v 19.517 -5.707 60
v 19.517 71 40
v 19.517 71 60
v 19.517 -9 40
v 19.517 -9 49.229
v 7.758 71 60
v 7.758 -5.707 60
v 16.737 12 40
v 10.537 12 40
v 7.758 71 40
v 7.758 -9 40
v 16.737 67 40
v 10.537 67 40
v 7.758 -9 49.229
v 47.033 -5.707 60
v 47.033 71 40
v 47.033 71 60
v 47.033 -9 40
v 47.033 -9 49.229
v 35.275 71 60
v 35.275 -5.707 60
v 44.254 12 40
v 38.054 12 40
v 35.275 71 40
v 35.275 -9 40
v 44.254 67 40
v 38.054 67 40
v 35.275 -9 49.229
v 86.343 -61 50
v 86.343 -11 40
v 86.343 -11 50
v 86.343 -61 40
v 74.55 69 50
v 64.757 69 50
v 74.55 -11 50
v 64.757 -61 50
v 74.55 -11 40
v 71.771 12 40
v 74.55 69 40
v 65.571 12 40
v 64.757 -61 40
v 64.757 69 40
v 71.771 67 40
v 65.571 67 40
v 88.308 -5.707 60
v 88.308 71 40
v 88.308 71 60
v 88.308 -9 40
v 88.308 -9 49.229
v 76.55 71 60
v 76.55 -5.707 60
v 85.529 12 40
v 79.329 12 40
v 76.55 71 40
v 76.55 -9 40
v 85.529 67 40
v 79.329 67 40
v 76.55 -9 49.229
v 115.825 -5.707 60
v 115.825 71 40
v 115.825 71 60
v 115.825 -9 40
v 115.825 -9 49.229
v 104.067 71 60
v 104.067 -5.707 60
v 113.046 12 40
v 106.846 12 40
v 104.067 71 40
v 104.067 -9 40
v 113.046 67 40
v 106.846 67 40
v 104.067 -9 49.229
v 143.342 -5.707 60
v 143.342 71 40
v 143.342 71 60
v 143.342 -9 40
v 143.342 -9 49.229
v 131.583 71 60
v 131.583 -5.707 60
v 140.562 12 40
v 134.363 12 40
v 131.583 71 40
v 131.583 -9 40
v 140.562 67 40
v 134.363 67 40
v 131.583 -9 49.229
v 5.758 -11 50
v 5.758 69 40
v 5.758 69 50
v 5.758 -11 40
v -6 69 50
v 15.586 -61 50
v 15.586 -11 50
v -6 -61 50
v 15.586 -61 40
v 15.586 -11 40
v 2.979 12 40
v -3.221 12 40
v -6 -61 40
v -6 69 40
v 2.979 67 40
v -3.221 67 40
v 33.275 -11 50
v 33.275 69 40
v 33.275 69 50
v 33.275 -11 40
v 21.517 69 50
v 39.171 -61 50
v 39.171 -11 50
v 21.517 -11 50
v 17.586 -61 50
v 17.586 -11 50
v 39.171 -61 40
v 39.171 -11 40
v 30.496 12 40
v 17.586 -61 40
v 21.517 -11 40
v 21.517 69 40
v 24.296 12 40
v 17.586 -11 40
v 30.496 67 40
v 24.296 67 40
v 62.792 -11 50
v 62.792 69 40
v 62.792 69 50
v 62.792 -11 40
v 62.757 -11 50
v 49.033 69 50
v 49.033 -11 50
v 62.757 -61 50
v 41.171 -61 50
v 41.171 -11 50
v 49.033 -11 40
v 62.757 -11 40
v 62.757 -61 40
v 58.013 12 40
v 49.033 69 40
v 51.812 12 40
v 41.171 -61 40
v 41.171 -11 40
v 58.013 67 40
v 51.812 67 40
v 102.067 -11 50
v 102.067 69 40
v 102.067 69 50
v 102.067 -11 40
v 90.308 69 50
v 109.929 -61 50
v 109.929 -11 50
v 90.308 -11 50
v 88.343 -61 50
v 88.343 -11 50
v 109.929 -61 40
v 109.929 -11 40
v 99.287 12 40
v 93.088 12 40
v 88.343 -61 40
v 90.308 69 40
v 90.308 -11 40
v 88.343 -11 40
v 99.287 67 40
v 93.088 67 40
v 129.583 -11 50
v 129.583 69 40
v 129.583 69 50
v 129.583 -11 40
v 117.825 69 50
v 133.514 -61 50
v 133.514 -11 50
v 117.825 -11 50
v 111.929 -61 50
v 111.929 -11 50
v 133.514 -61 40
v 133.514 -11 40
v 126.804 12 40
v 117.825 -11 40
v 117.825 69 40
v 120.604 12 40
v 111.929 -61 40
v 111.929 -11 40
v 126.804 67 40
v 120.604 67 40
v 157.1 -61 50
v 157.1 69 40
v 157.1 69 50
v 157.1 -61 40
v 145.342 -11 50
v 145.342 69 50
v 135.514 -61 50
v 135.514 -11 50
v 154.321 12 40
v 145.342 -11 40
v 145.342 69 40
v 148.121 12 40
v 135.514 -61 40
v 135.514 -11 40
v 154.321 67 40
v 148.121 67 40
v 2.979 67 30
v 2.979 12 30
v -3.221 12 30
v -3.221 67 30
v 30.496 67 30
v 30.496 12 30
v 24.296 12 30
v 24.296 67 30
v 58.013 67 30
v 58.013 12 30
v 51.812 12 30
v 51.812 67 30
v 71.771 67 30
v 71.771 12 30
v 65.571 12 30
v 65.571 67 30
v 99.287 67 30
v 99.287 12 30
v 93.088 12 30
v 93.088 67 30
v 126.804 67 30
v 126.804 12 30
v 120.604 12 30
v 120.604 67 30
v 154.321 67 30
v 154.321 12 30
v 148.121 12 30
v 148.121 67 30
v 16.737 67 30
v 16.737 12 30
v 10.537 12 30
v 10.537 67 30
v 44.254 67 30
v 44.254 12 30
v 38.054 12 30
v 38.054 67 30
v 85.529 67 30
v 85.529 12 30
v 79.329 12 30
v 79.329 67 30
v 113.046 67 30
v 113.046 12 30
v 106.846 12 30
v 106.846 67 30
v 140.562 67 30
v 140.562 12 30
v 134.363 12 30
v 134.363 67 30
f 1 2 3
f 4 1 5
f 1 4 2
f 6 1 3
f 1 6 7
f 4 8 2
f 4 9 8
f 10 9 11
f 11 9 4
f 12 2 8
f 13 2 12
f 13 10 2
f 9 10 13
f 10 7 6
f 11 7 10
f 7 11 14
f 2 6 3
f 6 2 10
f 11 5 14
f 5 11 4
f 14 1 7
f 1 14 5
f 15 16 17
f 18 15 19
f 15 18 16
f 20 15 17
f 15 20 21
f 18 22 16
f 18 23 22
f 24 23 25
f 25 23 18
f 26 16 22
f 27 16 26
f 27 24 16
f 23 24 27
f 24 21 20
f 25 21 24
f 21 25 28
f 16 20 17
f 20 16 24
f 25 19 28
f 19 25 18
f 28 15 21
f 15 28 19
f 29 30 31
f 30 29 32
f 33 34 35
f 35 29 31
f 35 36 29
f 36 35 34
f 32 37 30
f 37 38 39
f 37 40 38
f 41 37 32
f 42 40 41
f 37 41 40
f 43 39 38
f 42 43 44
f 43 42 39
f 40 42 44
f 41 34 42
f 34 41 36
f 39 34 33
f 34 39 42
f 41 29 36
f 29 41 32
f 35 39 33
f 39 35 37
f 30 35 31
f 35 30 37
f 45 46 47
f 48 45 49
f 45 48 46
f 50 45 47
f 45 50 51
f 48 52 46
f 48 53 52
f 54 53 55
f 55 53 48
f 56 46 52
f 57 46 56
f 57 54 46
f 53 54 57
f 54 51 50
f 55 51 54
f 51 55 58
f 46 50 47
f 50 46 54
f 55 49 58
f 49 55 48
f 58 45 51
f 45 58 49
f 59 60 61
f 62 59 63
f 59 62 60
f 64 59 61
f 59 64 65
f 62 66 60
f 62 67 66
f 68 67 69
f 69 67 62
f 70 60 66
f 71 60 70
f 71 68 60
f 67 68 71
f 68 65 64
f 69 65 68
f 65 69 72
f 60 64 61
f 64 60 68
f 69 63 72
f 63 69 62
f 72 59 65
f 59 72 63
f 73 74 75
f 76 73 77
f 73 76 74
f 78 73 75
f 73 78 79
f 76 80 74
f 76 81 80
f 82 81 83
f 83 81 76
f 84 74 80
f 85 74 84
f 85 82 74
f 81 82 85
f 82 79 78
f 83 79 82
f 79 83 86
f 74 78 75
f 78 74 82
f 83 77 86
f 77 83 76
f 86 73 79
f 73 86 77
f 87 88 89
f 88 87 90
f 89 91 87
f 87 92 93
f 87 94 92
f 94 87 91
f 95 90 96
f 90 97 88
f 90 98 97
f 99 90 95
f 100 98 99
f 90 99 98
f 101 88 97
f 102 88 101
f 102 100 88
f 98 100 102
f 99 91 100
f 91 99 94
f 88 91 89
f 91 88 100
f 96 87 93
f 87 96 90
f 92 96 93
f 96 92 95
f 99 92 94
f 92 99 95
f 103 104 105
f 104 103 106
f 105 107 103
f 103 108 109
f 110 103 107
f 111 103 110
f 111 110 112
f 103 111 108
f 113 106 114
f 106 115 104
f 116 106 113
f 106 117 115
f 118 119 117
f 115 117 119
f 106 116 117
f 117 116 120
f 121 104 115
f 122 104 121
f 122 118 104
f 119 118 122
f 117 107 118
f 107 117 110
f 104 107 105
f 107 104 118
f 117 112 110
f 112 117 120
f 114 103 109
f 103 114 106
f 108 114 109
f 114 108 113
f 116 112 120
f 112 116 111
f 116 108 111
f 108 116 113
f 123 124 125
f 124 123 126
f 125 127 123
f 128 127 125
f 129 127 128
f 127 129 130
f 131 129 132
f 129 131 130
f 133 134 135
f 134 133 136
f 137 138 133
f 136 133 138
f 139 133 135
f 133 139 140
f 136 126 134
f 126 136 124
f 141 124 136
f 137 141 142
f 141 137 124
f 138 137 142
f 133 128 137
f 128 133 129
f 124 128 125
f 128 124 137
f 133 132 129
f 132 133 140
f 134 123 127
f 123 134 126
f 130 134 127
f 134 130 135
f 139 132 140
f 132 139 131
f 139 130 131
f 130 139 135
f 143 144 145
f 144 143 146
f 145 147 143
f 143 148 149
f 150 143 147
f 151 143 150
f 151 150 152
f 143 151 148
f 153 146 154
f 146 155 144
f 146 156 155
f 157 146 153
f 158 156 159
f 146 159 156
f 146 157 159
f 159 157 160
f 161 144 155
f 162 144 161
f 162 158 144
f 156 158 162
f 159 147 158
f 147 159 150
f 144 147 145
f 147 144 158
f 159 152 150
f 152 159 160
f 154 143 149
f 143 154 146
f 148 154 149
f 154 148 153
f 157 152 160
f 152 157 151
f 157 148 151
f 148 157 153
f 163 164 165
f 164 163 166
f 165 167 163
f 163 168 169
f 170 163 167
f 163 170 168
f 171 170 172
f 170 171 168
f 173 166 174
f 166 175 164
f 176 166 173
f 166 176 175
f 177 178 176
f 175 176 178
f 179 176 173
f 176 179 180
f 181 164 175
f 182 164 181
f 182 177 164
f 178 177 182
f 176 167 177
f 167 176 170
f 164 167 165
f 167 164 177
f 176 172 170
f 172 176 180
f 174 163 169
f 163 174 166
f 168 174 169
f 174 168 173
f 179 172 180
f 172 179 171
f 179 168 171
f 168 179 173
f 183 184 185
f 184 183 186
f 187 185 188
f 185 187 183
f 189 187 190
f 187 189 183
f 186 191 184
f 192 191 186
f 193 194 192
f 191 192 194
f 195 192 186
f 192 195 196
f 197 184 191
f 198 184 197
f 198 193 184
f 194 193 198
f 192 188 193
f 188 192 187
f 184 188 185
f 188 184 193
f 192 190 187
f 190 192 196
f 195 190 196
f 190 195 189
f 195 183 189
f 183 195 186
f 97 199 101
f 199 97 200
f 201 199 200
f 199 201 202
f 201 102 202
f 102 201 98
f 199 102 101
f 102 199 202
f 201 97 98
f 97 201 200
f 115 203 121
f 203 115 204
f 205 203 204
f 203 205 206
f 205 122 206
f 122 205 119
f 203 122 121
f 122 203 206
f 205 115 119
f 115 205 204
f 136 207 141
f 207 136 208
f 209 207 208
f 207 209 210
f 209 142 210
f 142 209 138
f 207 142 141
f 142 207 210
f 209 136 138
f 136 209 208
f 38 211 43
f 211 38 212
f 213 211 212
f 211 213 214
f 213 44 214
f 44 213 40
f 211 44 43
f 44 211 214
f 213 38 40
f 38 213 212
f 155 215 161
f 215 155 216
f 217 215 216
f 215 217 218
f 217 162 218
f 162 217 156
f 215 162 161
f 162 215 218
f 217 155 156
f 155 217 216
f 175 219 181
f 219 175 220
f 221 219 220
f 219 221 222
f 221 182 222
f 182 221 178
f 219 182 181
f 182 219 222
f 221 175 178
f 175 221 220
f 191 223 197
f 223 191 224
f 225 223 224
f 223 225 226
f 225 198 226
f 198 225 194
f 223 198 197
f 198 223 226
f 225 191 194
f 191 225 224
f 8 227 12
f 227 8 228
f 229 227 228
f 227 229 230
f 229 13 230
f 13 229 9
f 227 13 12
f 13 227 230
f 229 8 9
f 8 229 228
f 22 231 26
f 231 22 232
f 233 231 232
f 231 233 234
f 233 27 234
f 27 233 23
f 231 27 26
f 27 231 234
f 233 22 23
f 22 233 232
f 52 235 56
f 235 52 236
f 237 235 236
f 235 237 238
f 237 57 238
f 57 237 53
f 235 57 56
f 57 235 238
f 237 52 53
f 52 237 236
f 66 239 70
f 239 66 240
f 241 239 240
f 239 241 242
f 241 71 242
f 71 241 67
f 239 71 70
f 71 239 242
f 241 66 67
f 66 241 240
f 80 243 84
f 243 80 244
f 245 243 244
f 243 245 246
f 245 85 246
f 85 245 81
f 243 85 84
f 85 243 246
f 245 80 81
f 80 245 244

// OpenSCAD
// file: snap_lock_v1.scad
//
//  Snap mechanism
//
//  by Egil Kvaleberg
//

// Which part
view = "neither";//"snap";//"both"; 	// [demo, both, snap, bracket]

//
//  main parameters, tune as required:
//

// distance between centers of mount holes that seperate
mount_cc_dist = 12;//20;//35.0; 
mount_cc_width = 9;//17;//32.0;

// thickness of main part
thickness0 = 1.7;
thickness = 4;//2.4;//3.0; 

// mounting screw diameter
screw_dia = 0;//2.5; // BUG: 3.0

screw_head = 2.0*screw_dia;

// tolerance
gap = 0.2; 

//screw_land = screw_dia/2; // land outside of screw head
screw_land = 0;

//snap_width = mount_cc_width - 2*screw_land - screw_head - 2*thickness;  // width of mechanism proper
snap_width = mount_cc_width - 2*thickness0;
//mount_width = mount_cc_width + 2*screw_land + screw_head;
mount_width = mount_cc_width;
//mount_height = 2*screw_land + screw_head;
mount_height = 0;
catch_width = snap_width * 0.15; // in addition to snap_width
snap_bar_width = (snap_width - 2.4 * catch_width) / 2 + 0; // room to flex
catch_min_width = 0.3 * snap_bar_width; // nicely rounded form
//catch_length = (mount_height+mount_cc_dist) / 4;
catch_length = (mount_cc_dist) / 4 + 0;;


d = 1*0.1;
$fs = 0.2;

module rounded_bar(r, h) {
	intersection() {
		cylinder(r=r, h=h);
		translate([0,0, h/2])
		cube([2*r * 0.85, 2*r* 0.85, h], center=true);
/*		hull() {
			translate([0, r, h/2 - r]) rotate([90,0,0]) cylinder(r=r, h=2*r);	
			translate([0, r, -(h/2 - r)]) rotate([90,0,0]) cylinder(r=r, h=2*r);		
		}
*/
	}
}

module screw_hole()
{
	sh = screw_head/2 - (screw_dia/2 + gap);	
	cylinder(r=screw_dia/2 + gap, h = d+thickness+d);
	translate([0, 0, d+thickness-sh])
		cylinder(r1=screw_dia/2 + gap, r2 = screw_head/2, h = sh+d);
}

module snap_half() {
	translate([-mount_width/2, 0, 0]) {
		// screw mount
		difference() {
			cube([mount_width/2 + d, mount_height, thickness]);
			translate([screw_land + screw_head/2, screw_land + screw_head/2, -d]) screw_hole();
		}
	}
	translate([-snap_width/2, 0, 0]) {
		// base arm
		cube([snap_bar_width, mount_height+mount_cc_dist+catch_min_width/2+d, thickness]);

		// catch
		translate([-catch_width, mount_height+mount_cc_dist, 0]) {
			hull() {
				cylinder(r=d, h=thickness); 
				translate([catch_width+snap_bar_width-catch_min_width/2, catch_min_width/2, 0]) 
					cylinder(r=catch_min_width/2, h=thickness); 
				// top of "arrow", sloping inwards to allow more bending
				translate([0.85 * (catch_width+snap_bar_width-catch_min_width/2), catch_length-catch_min_width/2, 0]) 
					cylinder(r=catch_min_width/2, h=thickness); 
			}
			//cube([catch_width, catch_length, thickness]);
		}

	}
}

module snap() {
	snap_half();
	mirror([1, 0, 0]) snap_half();	
}

module bracket_half() {

	translate([-mount_width/2, 0, 0]) {
		// screw mount
		difference() {
			cube([2*screw_land+screw_head+thickness, mount_height, thickness]);
			translate([screw_land + screw_head/2, screw_land + screw_head/2, -d]) screw_hole();
		}
		translate([2*screw_land+screw_head, 0, 0]) {
			cube([thickness, mount_height, thickness + gap + thickness]);
			translate([0, 0, gap + thickness]) {
				cube([snap_width/2 + thickness + d, mount_height, thickness]);
			}
		}

	}
}

module bracket() {
	bracket_half();
	mirror([1, 0, 0]) bracket_half();	
}

if (view == "demo") {
	snap();
	color("Red") translate([0, mount_cc_dist-d, 0]) bracket();
}
if (view == "snap") {
	snap();
}
if (view == "bracket") {
	translate([0, -2, 0]) rotate([90, 0, 0])  bracket();
}
if (view == "both") {
	snap();
	translate([0, -2, 0]) rotate([90, 0, 0])  bracket();
}
// main file
//include <irkem_hammerTips_v0.scad>
include <snap_lock_v1.scad>

xO = -6;
yO = -11;
zO = 40;

kH = 10;//4;
bH = 10;
wL = 50;
bL = 80;
oct = 6.5 * 25.4;
gap = 2;
n_oct = 1;//5;
n_keys = 12;//12 * n_oct;
oset = -1;

kn = 2;

sharpFlag = 1;

for (k = [0:1:(n_keys-1)]){
    //
    //translate([k*13.75+6.0+xO,12+yO,-12.5+zO]) rotate([0,180,0]) hammerTips();
}

for (k = [0:1:(n_oct-1)]){

//if (k==1){
//C:
color("ivory") translate([k*oct+0+xO,0+yO,0+zO]) cube([oct*1/12-gap,bL,kH]);
color("ivory") translate([k*oct+0+xO,-wL+yO,0+zO]) cube([oct*1/7-gap,wL,kH]);
//}

//if (k==2){
//C#:
if (sharpFlag){    
color("black") difference(){
    translate([k*oct+oct*1/12+xO,gap+yO,0+zO]) cube([oct*1/12-gap,bL,kH+bH]);
    rotate([-17,0,0]) translate([k*oct+oct*1/12+xO,gap+yO-10-14,0+zO]) cube([oct*1/12-gap,10,kH+bH]);
}
}
//}

//if (k==3){
//D:
color("ivory") translate([k*oct+oct*2/12+xO,0+yO,0+zO]) cube([oct*1/12-gap,bL,kH]);
color("ivory") translate([k*oct+oct*1/7+xO,-wL+yO,0+zO]) cube([oct*1/7-gap,wL,kH]);
//}

//if (k==4){
//D#:
if (sharpFlag){
color("black") difference(){
    translate([k*oct+oct*3/12+xO,gap+yO,0+zO]) cube([oct*1/12-gap,bL,kH+bH]);
    rotate([-17,0,0]) translate([k*oct+oct*3/12+xO,gap+yO-10-14,0+zO]) cube([oct*1/12-gap,10,kH+bH]);
}
}
//}

//if (k==5){
//E:
color("ivory") translate([k*oct+oct*4/12+xO,0+yO,0+zO]) cube([2+oct*1/12-gap,bL,kH]);
color("ivory") translate([k*oct+oct*2/7+xO,-wL+yO,0+zO]) cube([oct*1/7-gap,wL,kH]);
//}

//if (k==6){
//F:
color("ivory") difference(){
    translate([k*oct+oct*3/7+xO,-wL+yO,0+zO]) cube([oct*1/7-gap,wL+bL,kH]);
    translate([k*oct+oct*6/12-2+xO,0+yO,0+zO]) cube([4+oct*(1/7-1/12)-gap,bL,kH]);
}
color("ivory") translate([k*oct+oct*3/7+xO,-wL+yO,0+zO]) cube([oct*1/7-gap,wL,kH]);
//}

//if (k==7){
//F#:
if (sharpFlag){
color("black") difference(){
    translate([k*oct+oct*6/12+xO,gap+yO,0+zO]) cube([oct*1/12-gap,bL,kH+bH]);
    rotate([-17,0,0]) translate([k*oct+oct*6/12+xO,gap+yO-10-14,0+zO]) cube([oct*1/12-gap,10,kH+bH]);
}
}
//}

//if (k==8){
//G:
color("ivory") translate([k*oct+oct*7/12+xO,0+yO,0+zO]) cube([oct*1/12-gap,bL,kH]);
color("ivory") translate([k*oct+oct*4/7+xO,-wL+yO,0+zO]) cube([oct*1/7-gap,wL,kH]);
//}

//if (k==9){
//G#:
if (sharpFlag){
color("black") difference(){
    translate([k*oct+oct*8/12+xO,gap+yO,0+zO]) cube([oct*1/12-gap,bL,kH+bH]);
    rotate([-17,0,0]) translate([k*oct+oct*8/12+xO,gap+yO-10-14,0+zO]) cube([oct*1/12-gap,10,kH+bH]);
}
}
//}

//if (k==10){
//A:
color("ivory") translate([k*oct+oct*9/12+xO,0+yO,0+zO]) cube([oct*1/12-gap,bL,kH]);
color("ivory") translate([k*oct+oct*5/7+xO,-wL+yO,0+zO]) cube([oct*1/7-gap,wL,kH]);
//}

//if (k==11){
//A#:
if (sharpFlag){
color("black") difference(){translate([k*oct+oct*10/12+xO,gap+yO,0+zO]) cube([oct*1/12-gap,bL,kH+bH]);
    rotate([-17,0,0]) translate([k*oct+oct*10/12+xO,gap+yO-10-14,0+zO]) cube([oct*1/12-gap,10,kH+bH]);
}
}
//}

//if (k==12){
//B:
color("ivory") translate([k*oct+oct*11/12+xO,0+yO,0+zO]) cube([oct*1/12-gap,bL,kH]);
color("ivory") translate([k*oct+oct*6/7+xO,-wL+yO,0+zO]) cube([oct*1/7-gap,wL,kH]);
}
//}

for (i = [0,2,4,5,7,9,11]){//(kn-1)){//[0]){//(i = [0,2,4,5,7,9,11]){//[0:1:(n_keys-1)]){
    translate([oset+oct*i/12+(oct*1/12-6.2)/2+xO+0*oct,2+10+yO+12+3-4,-10+zO]) cube([6.2,bL-10-7-12-4+8,10]);
    //translate([0-0.2+oct*i/12+0*oct,-3+13,44-1.8-2]) rotate([-90,0,0]) snap();
    //translate([0-0.2+oct*i/12+0*oct,65,44-1.8-2]) rotate([-90,0,0]) snap();
}

if (sharpFlag){
    for (i = [1,3,6,8,10]){//[0:1:(n_keys-1)]){
    //translate([oset+oct*i/12+(oct*1/12-6.2)/2+xO,2+10+yO,-10+zO]) cube([6.2,bL-10,10]);
        translate([oset+oct*i/12+(oct*1/12-6.2)/2+xO+0*oct,2+10+yO+12+3-4,-10+zO]) cube([6.2,bL-10-7-12-4+8,10]);
    //translate([0-0.2+oct*i/12+0*oct,-3+13,44-1.8-2]) rotate([-90,0,0]) snap();
    //translate([0-0.2+oct*i/12+0*oct,65,44-1.8-2]) rotate([-90,0,0]) snap();
}
}
